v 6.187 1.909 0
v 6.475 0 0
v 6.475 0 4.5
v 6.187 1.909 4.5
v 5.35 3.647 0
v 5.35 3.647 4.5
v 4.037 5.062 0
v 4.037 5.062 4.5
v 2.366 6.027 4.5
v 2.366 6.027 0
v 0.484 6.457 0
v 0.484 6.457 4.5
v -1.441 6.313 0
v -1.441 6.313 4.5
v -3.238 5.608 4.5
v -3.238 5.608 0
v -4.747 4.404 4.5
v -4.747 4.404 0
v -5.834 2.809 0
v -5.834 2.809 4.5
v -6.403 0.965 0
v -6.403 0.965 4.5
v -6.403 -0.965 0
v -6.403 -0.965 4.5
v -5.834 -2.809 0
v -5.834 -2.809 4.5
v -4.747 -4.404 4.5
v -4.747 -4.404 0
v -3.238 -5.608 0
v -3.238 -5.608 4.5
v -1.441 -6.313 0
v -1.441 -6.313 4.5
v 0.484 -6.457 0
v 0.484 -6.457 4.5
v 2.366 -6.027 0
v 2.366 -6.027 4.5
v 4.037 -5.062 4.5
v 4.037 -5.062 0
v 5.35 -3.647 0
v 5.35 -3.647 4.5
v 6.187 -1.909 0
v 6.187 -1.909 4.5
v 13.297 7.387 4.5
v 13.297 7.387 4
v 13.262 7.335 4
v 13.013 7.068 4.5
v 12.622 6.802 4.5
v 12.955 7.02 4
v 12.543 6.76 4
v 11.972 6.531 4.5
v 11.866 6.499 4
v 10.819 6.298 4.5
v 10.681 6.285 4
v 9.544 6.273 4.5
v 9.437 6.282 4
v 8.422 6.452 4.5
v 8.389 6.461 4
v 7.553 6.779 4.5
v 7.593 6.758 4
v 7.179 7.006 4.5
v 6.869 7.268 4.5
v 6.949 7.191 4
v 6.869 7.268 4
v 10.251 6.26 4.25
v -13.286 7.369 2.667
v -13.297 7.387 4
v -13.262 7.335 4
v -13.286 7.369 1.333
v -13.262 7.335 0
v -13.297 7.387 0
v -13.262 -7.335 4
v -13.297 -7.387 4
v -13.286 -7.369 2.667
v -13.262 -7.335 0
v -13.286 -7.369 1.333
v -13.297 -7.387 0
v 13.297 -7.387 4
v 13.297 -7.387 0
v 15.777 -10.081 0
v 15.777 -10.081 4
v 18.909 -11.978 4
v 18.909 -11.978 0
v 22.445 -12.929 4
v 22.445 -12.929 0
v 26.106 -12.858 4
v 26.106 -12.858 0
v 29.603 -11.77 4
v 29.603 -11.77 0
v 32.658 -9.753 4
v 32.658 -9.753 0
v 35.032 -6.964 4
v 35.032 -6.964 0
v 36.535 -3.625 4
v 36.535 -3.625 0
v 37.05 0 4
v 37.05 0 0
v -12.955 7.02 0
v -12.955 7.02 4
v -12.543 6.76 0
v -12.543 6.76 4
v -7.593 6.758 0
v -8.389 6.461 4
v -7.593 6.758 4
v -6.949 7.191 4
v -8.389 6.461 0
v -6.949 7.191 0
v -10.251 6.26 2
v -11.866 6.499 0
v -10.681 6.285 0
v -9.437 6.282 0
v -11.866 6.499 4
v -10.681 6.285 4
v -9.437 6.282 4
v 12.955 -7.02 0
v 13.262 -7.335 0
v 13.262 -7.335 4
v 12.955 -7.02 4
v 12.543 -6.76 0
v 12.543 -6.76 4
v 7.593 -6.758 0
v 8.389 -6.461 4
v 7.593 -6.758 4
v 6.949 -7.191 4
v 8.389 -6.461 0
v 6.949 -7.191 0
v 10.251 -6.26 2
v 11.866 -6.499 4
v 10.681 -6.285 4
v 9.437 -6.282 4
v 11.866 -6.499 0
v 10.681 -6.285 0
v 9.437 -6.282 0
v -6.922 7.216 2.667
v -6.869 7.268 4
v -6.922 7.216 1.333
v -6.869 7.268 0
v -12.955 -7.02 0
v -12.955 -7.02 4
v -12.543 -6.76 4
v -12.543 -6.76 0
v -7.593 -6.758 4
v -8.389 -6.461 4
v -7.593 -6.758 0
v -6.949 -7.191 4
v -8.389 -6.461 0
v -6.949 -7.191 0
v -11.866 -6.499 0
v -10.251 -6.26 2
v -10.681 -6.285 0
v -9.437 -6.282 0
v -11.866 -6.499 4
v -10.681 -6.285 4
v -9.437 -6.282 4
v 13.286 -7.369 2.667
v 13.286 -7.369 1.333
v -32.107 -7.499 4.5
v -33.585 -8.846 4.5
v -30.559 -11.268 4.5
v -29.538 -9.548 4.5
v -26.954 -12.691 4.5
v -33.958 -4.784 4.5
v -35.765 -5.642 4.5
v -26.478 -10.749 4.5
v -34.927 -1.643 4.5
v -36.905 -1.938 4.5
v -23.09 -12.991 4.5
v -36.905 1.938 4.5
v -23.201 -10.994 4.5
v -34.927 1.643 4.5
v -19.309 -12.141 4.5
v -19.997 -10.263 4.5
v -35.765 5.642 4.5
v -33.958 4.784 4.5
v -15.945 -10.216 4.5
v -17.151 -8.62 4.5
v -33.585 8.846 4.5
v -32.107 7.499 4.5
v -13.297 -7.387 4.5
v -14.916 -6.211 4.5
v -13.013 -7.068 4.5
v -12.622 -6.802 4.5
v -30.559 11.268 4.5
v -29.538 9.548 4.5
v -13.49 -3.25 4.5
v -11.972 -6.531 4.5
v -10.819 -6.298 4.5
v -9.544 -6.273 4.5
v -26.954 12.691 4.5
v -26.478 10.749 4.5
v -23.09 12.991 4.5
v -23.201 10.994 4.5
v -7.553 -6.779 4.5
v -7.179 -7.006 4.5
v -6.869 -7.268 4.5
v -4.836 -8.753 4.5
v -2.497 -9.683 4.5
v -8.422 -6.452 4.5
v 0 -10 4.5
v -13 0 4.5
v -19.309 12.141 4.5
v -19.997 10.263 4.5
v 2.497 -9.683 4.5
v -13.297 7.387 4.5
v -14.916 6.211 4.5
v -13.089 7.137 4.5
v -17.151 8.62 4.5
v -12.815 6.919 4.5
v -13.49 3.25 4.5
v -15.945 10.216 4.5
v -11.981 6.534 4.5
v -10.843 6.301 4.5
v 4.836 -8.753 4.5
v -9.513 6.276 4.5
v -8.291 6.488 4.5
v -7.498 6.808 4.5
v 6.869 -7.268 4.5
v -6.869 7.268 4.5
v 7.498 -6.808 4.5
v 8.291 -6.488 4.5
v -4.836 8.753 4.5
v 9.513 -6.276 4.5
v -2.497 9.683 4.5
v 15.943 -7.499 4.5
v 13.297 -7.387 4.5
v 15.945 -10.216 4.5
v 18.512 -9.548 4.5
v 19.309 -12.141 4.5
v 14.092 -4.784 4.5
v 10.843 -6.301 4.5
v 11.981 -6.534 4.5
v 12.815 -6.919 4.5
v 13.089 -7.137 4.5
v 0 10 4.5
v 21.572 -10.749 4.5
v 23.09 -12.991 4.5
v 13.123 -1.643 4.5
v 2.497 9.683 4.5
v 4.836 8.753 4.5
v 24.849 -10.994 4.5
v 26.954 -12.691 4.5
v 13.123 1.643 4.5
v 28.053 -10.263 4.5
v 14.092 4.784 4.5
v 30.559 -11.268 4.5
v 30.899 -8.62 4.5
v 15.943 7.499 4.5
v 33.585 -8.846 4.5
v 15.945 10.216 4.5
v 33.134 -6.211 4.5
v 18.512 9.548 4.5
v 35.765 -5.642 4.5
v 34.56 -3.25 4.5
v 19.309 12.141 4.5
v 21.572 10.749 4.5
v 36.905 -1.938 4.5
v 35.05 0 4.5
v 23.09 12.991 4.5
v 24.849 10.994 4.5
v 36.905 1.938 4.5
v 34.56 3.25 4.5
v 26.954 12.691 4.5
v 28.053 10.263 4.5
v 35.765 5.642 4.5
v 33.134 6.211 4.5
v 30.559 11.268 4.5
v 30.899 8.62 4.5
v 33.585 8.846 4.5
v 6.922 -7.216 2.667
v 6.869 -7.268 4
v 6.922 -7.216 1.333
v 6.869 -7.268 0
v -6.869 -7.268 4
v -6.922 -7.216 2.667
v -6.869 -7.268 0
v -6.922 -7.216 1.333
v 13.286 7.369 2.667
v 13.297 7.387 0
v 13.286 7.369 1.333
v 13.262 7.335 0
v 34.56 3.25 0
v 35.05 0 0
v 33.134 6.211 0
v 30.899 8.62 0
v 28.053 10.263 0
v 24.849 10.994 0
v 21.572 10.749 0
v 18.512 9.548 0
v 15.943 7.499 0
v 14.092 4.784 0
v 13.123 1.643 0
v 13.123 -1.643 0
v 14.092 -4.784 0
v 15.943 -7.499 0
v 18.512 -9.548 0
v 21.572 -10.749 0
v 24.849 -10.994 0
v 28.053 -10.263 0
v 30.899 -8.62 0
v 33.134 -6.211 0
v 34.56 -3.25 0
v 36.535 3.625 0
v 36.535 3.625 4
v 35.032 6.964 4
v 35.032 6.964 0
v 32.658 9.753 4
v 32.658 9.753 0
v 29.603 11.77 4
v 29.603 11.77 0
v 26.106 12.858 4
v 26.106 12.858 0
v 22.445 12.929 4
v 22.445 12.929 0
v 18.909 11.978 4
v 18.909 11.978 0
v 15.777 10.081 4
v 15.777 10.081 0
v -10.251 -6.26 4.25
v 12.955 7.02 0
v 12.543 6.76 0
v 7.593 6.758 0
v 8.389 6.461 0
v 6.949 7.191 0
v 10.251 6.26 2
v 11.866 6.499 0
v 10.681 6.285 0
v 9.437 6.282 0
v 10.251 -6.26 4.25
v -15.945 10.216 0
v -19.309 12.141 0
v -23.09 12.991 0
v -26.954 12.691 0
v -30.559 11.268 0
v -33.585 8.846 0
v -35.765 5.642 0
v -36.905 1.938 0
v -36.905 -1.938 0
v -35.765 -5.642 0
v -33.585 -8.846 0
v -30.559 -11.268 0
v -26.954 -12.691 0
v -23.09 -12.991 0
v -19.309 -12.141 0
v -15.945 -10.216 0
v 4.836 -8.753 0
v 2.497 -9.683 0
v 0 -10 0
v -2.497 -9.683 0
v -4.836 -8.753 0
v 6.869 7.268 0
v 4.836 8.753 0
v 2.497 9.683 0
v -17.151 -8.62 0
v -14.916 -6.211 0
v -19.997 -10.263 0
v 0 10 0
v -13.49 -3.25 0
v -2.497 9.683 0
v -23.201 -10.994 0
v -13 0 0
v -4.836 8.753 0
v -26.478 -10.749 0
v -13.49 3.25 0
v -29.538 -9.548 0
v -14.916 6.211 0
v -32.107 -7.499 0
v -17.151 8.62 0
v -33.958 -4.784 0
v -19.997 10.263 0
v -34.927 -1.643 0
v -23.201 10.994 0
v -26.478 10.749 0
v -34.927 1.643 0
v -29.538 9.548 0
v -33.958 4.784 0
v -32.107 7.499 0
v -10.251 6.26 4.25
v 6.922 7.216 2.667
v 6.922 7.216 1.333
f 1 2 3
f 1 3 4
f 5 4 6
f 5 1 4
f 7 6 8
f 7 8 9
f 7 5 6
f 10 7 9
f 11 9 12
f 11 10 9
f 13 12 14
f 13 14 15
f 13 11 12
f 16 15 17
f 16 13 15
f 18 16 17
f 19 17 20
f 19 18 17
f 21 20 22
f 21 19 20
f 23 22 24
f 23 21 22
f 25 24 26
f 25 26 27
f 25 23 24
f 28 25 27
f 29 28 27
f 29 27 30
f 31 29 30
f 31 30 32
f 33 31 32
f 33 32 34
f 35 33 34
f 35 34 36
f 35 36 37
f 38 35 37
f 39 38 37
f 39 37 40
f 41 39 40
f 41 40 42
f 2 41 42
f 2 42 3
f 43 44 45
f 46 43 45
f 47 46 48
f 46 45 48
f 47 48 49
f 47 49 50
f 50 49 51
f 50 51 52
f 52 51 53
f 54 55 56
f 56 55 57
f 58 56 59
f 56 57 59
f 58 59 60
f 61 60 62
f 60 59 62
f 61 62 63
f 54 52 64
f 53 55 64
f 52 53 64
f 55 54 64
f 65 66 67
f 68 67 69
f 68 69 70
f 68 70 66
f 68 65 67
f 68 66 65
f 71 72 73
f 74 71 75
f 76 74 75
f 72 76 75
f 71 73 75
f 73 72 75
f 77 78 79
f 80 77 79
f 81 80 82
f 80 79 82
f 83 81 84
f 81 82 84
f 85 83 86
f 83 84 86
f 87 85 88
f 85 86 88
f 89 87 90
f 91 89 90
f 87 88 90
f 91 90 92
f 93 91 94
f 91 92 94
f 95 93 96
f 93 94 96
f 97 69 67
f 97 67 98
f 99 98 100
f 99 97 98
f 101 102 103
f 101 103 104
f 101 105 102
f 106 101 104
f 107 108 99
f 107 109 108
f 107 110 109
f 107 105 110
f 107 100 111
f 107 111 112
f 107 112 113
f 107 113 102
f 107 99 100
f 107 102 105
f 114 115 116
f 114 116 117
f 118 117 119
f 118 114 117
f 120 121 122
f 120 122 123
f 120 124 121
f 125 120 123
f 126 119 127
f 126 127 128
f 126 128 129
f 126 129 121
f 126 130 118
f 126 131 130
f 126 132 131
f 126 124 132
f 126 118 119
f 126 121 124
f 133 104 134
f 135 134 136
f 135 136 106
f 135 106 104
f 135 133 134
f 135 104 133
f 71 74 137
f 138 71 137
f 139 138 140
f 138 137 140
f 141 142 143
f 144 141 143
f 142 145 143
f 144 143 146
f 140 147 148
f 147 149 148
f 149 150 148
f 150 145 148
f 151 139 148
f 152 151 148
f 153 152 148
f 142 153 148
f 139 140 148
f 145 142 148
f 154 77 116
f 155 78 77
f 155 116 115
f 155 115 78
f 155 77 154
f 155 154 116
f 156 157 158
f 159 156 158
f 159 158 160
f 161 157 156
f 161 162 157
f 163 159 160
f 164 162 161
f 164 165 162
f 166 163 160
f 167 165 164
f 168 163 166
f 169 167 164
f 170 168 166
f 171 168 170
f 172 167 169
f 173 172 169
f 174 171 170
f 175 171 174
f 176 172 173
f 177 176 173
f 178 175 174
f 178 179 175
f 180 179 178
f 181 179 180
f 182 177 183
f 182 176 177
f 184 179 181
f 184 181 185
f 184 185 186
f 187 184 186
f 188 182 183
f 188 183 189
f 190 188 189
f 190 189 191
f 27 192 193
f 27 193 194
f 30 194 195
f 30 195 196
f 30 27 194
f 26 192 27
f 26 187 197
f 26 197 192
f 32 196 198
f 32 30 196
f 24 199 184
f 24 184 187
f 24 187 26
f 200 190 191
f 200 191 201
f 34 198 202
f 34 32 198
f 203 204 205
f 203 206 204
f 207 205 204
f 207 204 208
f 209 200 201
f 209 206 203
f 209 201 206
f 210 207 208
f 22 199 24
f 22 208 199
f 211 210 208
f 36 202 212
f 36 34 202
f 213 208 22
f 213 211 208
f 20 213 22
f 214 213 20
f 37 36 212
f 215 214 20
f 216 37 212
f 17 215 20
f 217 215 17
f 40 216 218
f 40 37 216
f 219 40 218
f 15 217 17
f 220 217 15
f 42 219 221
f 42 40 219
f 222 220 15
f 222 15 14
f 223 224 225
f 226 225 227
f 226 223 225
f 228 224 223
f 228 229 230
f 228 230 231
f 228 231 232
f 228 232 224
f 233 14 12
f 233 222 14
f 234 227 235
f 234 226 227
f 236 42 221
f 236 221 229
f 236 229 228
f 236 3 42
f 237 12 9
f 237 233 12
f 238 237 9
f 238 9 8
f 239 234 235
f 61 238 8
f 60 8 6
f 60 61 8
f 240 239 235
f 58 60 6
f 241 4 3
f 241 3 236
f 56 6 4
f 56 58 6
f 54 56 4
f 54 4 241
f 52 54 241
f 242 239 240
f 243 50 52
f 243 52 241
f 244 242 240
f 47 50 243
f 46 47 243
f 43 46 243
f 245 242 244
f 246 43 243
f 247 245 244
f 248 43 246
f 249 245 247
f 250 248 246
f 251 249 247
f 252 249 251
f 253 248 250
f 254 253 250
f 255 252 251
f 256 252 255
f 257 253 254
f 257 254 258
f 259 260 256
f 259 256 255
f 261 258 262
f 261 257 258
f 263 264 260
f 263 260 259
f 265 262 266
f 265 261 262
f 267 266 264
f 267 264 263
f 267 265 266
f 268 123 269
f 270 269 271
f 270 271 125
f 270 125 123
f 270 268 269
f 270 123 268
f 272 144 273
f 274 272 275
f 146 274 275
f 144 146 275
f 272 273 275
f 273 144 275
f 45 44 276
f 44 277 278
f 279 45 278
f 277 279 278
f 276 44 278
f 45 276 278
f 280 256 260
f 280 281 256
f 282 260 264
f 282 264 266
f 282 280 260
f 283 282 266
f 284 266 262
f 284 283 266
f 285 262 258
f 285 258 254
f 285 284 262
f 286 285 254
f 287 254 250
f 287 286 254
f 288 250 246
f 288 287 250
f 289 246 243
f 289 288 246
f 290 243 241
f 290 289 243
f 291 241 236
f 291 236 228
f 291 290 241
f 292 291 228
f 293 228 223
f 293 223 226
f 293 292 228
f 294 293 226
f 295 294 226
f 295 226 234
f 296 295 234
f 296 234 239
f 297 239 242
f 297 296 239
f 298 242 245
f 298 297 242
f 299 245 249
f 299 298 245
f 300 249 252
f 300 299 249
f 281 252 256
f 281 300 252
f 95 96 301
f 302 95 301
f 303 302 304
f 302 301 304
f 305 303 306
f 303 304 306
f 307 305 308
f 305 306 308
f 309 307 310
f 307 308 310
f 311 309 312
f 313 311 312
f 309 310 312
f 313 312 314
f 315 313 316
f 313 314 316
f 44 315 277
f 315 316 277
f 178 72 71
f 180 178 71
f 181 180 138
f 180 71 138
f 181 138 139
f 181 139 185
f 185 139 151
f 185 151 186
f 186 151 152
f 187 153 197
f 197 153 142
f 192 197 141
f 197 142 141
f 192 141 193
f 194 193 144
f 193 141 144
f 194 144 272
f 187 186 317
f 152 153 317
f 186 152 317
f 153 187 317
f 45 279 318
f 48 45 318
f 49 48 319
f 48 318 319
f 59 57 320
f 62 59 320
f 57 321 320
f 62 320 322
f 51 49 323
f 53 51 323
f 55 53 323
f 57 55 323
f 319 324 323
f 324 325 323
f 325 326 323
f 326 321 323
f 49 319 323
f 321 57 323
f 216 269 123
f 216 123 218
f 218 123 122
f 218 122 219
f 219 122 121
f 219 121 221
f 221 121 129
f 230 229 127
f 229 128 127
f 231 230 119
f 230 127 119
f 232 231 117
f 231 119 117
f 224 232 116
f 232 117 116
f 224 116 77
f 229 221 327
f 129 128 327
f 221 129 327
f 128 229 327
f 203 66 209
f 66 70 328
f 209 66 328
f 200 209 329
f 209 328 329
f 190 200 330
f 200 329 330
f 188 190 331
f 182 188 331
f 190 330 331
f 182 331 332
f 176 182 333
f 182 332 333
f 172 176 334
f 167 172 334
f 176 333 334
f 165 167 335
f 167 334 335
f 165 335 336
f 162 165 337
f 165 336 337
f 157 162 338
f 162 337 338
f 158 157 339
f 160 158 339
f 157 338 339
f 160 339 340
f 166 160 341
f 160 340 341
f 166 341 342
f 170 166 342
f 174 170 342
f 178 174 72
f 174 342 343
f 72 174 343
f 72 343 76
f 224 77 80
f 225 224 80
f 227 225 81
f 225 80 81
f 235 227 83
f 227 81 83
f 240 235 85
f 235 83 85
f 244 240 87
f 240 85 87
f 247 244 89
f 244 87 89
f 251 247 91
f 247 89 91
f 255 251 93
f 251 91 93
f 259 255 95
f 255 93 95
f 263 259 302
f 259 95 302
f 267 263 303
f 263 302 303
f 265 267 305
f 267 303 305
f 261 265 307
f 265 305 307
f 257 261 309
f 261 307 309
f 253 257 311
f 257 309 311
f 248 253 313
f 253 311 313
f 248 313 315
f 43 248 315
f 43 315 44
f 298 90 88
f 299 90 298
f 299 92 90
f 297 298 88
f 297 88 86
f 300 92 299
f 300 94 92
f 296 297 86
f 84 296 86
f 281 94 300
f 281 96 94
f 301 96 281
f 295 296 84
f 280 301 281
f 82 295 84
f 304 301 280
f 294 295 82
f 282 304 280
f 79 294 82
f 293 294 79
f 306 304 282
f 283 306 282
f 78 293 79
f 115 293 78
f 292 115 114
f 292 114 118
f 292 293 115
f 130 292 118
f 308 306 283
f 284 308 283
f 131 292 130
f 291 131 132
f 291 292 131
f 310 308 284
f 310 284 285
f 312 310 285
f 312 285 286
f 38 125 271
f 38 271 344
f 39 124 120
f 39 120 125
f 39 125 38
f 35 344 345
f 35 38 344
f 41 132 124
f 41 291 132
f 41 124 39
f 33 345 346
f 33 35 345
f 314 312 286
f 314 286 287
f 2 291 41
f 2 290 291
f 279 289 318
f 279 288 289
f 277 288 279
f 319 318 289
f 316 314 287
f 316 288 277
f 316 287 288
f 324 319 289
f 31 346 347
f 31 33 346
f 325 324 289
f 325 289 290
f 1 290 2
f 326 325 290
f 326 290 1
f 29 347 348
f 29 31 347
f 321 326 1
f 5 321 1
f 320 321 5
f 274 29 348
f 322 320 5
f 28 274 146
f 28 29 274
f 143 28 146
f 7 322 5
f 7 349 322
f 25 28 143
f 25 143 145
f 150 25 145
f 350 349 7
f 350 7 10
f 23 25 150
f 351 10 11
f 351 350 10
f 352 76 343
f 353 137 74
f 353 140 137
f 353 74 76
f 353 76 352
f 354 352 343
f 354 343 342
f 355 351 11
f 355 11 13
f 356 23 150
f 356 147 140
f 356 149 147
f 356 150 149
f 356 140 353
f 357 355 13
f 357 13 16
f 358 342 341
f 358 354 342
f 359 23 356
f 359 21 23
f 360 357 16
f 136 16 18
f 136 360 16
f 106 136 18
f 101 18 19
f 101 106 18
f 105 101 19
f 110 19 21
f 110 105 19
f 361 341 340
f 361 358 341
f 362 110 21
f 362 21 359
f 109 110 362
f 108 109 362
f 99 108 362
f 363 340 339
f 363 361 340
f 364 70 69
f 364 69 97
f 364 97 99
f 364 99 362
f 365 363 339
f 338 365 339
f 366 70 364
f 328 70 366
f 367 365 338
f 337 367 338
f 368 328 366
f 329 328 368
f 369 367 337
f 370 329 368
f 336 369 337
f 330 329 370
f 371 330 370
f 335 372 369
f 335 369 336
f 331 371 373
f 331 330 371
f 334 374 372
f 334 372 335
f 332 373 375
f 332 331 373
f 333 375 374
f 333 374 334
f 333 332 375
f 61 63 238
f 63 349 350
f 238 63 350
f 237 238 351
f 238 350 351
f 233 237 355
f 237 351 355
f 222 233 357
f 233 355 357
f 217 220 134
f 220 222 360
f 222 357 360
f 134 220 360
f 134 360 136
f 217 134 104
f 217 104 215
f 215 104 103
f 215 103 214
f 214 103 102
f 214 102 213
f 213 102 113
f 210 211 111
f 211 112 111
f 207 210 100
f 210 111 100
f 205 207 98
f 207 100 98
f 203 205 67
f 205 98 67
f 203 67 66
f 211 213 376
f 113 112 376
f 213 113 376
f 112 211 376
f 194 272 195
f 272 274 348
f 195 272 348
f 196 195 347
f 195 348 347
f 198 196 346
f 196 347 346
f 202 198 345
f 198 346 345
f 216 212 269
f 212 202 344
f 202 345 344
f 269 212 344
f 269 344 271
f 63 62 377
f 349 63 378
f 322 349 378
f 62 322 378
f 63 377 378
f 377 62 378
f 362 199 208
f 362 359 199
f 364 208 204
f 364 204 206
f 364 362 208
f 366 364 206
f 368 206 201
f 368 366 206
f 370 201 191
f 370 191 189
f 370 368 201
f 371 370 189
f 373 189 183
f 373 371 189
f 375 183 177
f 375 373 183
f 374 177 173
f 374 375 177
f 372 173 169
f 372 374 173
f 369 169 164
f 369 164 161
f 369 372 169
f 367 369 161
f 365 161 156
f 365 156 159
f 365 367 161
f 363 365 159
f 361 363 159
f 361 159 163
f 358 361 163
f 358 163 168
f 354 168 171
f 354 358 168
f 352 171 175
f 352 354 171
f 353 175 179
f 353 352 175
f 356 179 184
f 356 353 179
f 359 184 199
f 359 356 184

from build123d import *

# Parameters (mm, degrees)
F0_R        = 11.025
F0_R_2      = 8
F0_R_3      = 6.475
F1_DEPTH    = 4
F2_DEPTH    = 4.5
F1_FACE_R   = 11.025
F1_FACE_R_2 = 8
F3_DEPTH    = 0.5


# Not quite as in the source:
# - a feature names something its author has since deleted; it is built from what else it names


with BuildPart() as f1:
    # F0 (on Top) → F1 (new body)
    with BuildSketch(Plane.XY):
        with BuildLine():
            add(Edge.make_bspline(
                [(-13.2970699227, 7.3866190681), (-13.2858031983, 7.3692786835), (-13.2740607617, 7.352142708), (-13.2618542065, 7.3352108101)],
                knots=[0, 0, 0, 0, 0.0117546856, 0.0117546856, 0.0117546856, 0.0117546856], degree=3))
            ThreePointArc((-13.2970699227, 7.3866190681), (-37.05, 0), (-13.2970699227, -7.3866190681))
            add(Edge.make_bspline(
                [(-13.2970699227, -7.3866190681), (-13.2858031983, -7.3692786835), (-13.2740607617, -7.352142708), (-13.2618542065, -7.3352108101)],
                knots=[0, 0, 0, 0, 0.0117546856, 0.0117546856, 0.0117546856, 0.0117546856], degree=3))
            ThreePointArc((-13.2618542065, -7.3352108101), (-11.5783016635, -3.8380106201), (-11, 0))
            ThreePointArc((-11, 0), (-11.5783016635, 3.8380106201), (-13.2618542065, 7.3352108101))
        make_face()
        with Locations((-24.025, 0)):
            Circle(F0_R, mode=Mode.SUBTRACT)
        with BuildLine():
            add(Edge.make_bspline(
                [(13.2970699227, 7.3866190681), (13.2858031983, 7.3692786835), (13.2740607617, 7.352142708), (13.2618542065, 7.3352108101)],
                knots=[0, 0, 0, 0, 0.0117546856, 0.0117546856, 0.0117546856, 0.0117546856], degree=3))
            ThreePointArc((13.2618542065, 7.3352108101), (11, 0), (13.2618542065, -7.3352108101))
            add(Edge.make_bspline(
                [(13.2970699227, -7.3866190681), (13.2858031983, -7.3692786835), (13.2740607617, -7.352142708), (13.2618542065, -7.3352108101)],
                knots=[0, 0, 0, 0, 0.0117546856, 0.0117546856, 0.0117546856, 0.0117546856], degree=3))
            ThreePointArc((13.2970699227, -7.3866190681), (27.8927729861, -12.4374819448), (37.05, 0))
            ThreePointArc((37.05, 0), (27.8927729861, 12.4374819448), (13.2970699227, 7.3866190681))
        make_face()
        with Locations((24.025, 0)):
            Circle(F0_R, mode=Mode.SUBTRACT)
        with BuildLine():
            add(Edge.make_bspline(
                [(-6.9491121946, 7.1909554099), (-6.9214787847, 7.2161071506), (-6.8945995038, 7.2417846871), (-6.8685019311, 7.2679901776)],
                knots=[0.9815772058, 0.9815772058, 0.9815772058, 0.9815772058, 1, 1, 1, 1], degree=3))
            ThreePointArc((-6.9491121946, 7.1909554099), (-10, 0), (-6.9491121946, -7.1909554099))
            add(Edge.make_bspline(
                [(-6.9491121946, -7.1909554099), (-6.9214787847, -7.2161071506), (-6.8945995038, -7.2417846871), (-6.8685019311, -7.2679901776)],
                knots=[0.9815772058, 0.9815772058, 0.9815772058, 0.9815772058, 1, 1, 1, 1], degree=3))
            ThreePointArc((-6.8685019311, -7.2679901776), (0, -10), (6.8685019311, -7.2679901776))
            add(Edge.make_bspline(
                [(6.9491121946, -7.1909554099), (6.9214787847, -7.2161071506), (6.8945995038, -7.2417846871), (6.8685019311, -7.2679901776)],
                knots=[0.9815772058, 0.9815772058, 0.9815772058, 0.9815772058, 1, 1, 1, 1], degree=3))
            ThreePointArc((6.9491121946, -7.1909554099), (9.2057352217, -3.9056931558), (10, 0))
            ThreePointArc((10, 0), (9.2057352217, 3.9056931558), (6.9491121946, 7.1909554099))
            add(Edge.make_bspline(
                [(6.9491121946, 7.1909554099), (6.9214787847, 7.2161071506), (6.8945995038, 7.2417846871), (6.8685019311, 7.2679901776)],
                knots=[0.9815772058, 0.9815772058, 0.9815772058, 0.9815772058, 1, 1, 1, 1], degree=3))
            ThreePointArc((6.8685019311, 7.2679901776), (0, 10), (-6.8685019311, 7.2679901776))
        make_face()
        Circle(F0_R_2, mode=Mode.SUBTRACT)
        Circle(F0_R_2)
        Circle(F0_R_3, mode=Mode.SUBTRACT)
        with BuildLine():
            add(Edge.make_bspline(
                [(-13.2618542065, 7.3352108101), (-12.765654406, 6.6469245328), (-10.2019626219, 5.934402015), (-7.687078337, 6.5192636743), (-6.9491121946, 7.1909554099)],
                knots=[0.0117546856, 0.0117546856, 0.0117546856, 0.0117546856, 0.4895858662, 0.9815772058, 0.9815772058, 0.9815772058, 0.9815772058], degree=3))
            ThreePointArc((-13.2618542065, 7.3352108101), (-11.5783016635, 3.8380106201), (-11, 0))
            ThreePointArc((-11, 0), (-11.5783016635, -3.8380106201), (-13.2618542065, -7.3352108101))
            add(Edge.make_bspline(
                [(-13.2618542065, -7.3352108101), (-12.765654406, -6.6469245328), (-10.2019626219, -5.934402015), (-7.687078337, -6.5192636743), (-6.9491121946, -7.1909554099)],
                knots=[0.0117546856, 0.0117546856, 0.0117546856, 0.0117546856, 0.4895858662, 0.9815772058, 0.9815772058, 0.9815772058, 0.9815772058], degree=3))
            ThreePointArc((-6.9491121946, -7.1909554099), (-10, 0), (-6.9491121946, 7.1909554099))
        make_face()
        with BuildLine():
            add(Edge.make_bspline(
                [(13.2618542065, 7.3352108101), (12.765654406, 6.6469245328), (10.2019626219, 5.934402015), (7.687078337, 6.5192636743), (6.9491121946, 7.1909554099)],
                knots=[0.0117546856, 0.0117546856, 0.0117546856, 0.0117546856, 0.4895858662, 0.9815772058, 0.9815772058, 0.9815772058, 0.9815772058], degree=3))
            ThreePointArc((6.9491121946, 7.1909554099), (9.2057352217, 3.9056931558), (10, 0))
            ThreePointArc((10, 0), (9.2057352217, -3.9056931558), (6.9491121946, -7.1909554099))
            add(Edge.make_bspline(
                [(13.2618542065, -7.3352108101), (12.765654406, -6.6469245328), (10.2019626219, -5.934402015), (7.687078337, -6.5192636743), (6.9491121946, -7.1909554099)],
                knots=[0.0117546856, 0.0117546856, 0.0117546856, 0.0117546856, 0.4895858662, 0.9815772058, 0.9815772058, 0.9815772058, 0.9815772058], degree=3))
            ThreePointArc((13.2618542065, -7.3352108101), (11, 0), (13.2618542065, 7.3352108101))
        make_face()
    extrude(amount=F1_DEPTH)

    # F0 (on Top) → F2 (join)
    with BuildSketch(Plane.XY):
        Circle(F0_R_2)
        Circle(F0_R_3, mode=Mode.SUBTRACT)
    extrude(amount=F2_DEPTH)

    # F1_face (on face) + F0 (on Top) → F3 (join, through all)
    with BuildSketch(Plane.XY.offset(4)):
        with BuildLine():
            ThreePointArc((-6.8685019311, -7.2679901776), (0, -10), (6.8685019311, -7.2679901776))
            add(Edge.make_bspline(
                [(6.8685019311, -7.2679901776), (7.591550229, -6.5419519543), (10.1837329047, -5.9134794065), (12.8278077735, -6.6643873129), (13.2970699227, -7.3866190681)],
                knots=[0.9815772058, 0.9815772058, 0.9815772058, 0.9815772058, 1.4919913396, 1.9815772058, 1.9815772058, 1.9815772058, 1.9815772058], degree=3))
            ThreePointArc((13.2970699227, -7.3866190681), (37.05, 0), (13.2970699227, 7.3866190681))
            add(Edge.make_bspline(
                [(13.2970699227, 7.3866190681), (12.8278077735, 6.6643873129), (10.1837329047, 5.9134794065), (7.591550229, 6.5419519543), (6.8685019311, 7.2679901776)],
                knots=[0, 0, 0, 0, 0.4895858662, 1, 1, 1, 1], degree=3))
            ThreePointArc((6.8685019311, 7.2679901776), (0, 10), (-6.8685019311, 7.2679901776))
            add(Edge.make_bspline(
                [(-6.8685019311, 7.2679901776), (-7.591550229, 6.5419519543), (-10.1837329047, 5.9134794066), (-12.8278077735, 6.6643873129), (-13.2970699227, 7.3866190681)],
                knots=[0.9815772058, 0.9815772058, 0.9815772058, 0.9815772058, 1.4919913396, 1.9815772058, 1.9815772058, 1.9815772058, 1.9815772058], degree=3))
            ThreePointArc((-13.2970699227, 7.3866190681), (-37.05, 0), (-13.2970699227, -7.3866190681))
            add(Edge.make_bspline(
                [(-13.2970699227, -7.3866190681), (-12.8278077735, -6.6643873129), (-10.1837329047, -5.9134794065), (-7.591550229, -6.5419519543), (-6.8685019311, -7.2679901776)],
                knots=[0, 0, 0, 0, 0.4895858662, 1, 1, 1, 1], degree=3))
        make_face()
        with Locations((-24.025, 0)):
            Circle(F1_FACE_R, mode=Mode.SUBTRACT)
        Circle(F1_FACE_R_2, mode=Mode.SUBTRACT)
        with Locations((24.025, 0)):
            Circle(F1_FACE_R, mode=Mode.SUBTRACT)
    with BuildSketch(Plane.XY):
        with BuildLine():
            add(Edge.make_bspline(
                [(-13.2970699227, 7.3866190681), (-13.2858031983, 7.3692786835), (-13.2740607617, 7.352142708), (-13.2618542065, 7.3352108101)],
                knots=[0, 0, 0, 0, 0.0117546856, 0.0117546856, 0.0117546856, 0.0117546856], degree=3))
            ThreePointArc((-13.2970699227, 7.3866190681), (-37.05, 0), (-13.2970699227, -7.3866190681))
            add(Edge.make_bspline(
                [(-13.2970699227, -7.3866190681), (-13.2858031983, -7.3692786835), (-13.2740607617, -7.352142708), (-13.2618542065, -7.3352108101)],
                knots=[0, 0, 0, 0, 0.0117546856, 0.0117546856, 0.0117546856, 0.0117546856], degree=3))
            ThreePointArc((-13.2618542065, -7.3352108101), (-11.5783016635, -3.8380106201), (-11, 0))
            ThreePointArc((-11, 0), (-11.5783016635, 3.8380106201), (-13.2618542065, 7.3352108101))
        make_face()
        with Locations((-24.025, 0)):
            Circle(F0_R, mode=Mode.SUBTRACT)
        with BuildLine():
            add(Edge.make_bspline(
                [(-13.2618542065, 7.3352108101), (-12.765654406, 6.6469245328), (-10.2019626219, 5.934402015), (-7.687078337, 6.5192636743), (-6.9491121946, 7.1909554099)],
                knots=[0.0117546856, 0.0117546856, 0.0117546856, 0.0117546856, 0.4895858662, 0.9815772058, 0.9815772058, 0.9815772058, 0.9815772058], degree=3))
            ThreePointArc((-13.2618542065, 7.3352108101), (-11.5783016635, 3.8380106201), (-11, 0))
            ThreePointArc((-11, 0), (-11.5783016635, -3.8380106201), (-13.2618542065, -7.3352108101))
            add(Edge.make_bspline(
                [(-13.2618542065, -7.3352108101), (-12.765654406, -6.6469245328), (-10.2019626219, -5.934402015), (-7.687078337, -6.5192636743), (-6.9491121946, -7.1909554099)],
                knots=[0.0117546856, 0.0117546856, 0.0117546856, 0.0117546856, 0.4895858662, 0.9815772058, 0.9815772058, 0.9815772058, 0.9815772058], degree=3))
            ThreePointArc((-6.9491121946, -7.1909554099), (-10, 0), (-6.9491121946, 7.1909554099))
        make_face()
        with BuildLine():
            add(Edge.make_bspline(
                [(-6.9491121946, 7.1909554099), (-6.9214787847, 7.2161071506), (-6.8945995038, 7.2417846871), (-6.8685019311, 7.2679901776)],
                knots=[0.9815772058, 0.9815772058, 0.9815772058, 0.9815772058, 1, 1, 1, 1], degree=3))
            ThreePointArc((-6.9491121946, 7.1909554099), (-10, 0), (-6.9491121946, -7.1909554099))
            add(Edge.make_bspline(
                [(-6.9491121946, -7.1909554099), (-6.9214787847, -7.2161071506), (-6.8945995038, -7.2417846871), (-6.8685019311, -7.2679901776)],
                knots=[0.9815772058, 0.9815772058, 0.9815772058, 0.9815772058, 1, 1, 1, 1], degree=3))
            ThreePointArc((-6.8685019311, -7.2679901776), (0, -10), (6.8685019311, -7.2679901776))
            add(Edge.make_bspline(
                [(6.9491121946, -7.1909554099), (6.9214787847, -7.2161071506), (6.8945995038, -7.2417846871), (6.8685019311, -7.2679901776)],
                knots=[0.9815772058, 0.9815772058, 0.9815772058, 0.9815772058, 1, 1, 1, 1], degree=3))
            ThreePointArc((6.9491121946, -7.1909554099), (9.2057352217, -3.9056931558), (10, 0))
            ThreePointArc((10, 0), (9.2057352217, 3.9056931558), (6.9491121946, 7.1909554099))
            add(Edge.make_bspline(
                [(6.9491121946, 7.1909554099), (6.9214787847, 7.2161071506), (6.8945995038, 7.2417846871), (6.8685019311, 7.2679901776)],
                knots=[0.9815772058, 0.9815772058, 0.9815772058, 0.9815772058, 1, 1, 1, 1], degree=3))
            ThreePointArc((6.8685019311, 7.2679901776), (0, 10), (-6.8685019311, 7.2679901776))
        make_face()
        Circle(F0_R_2, mode=Mode.SUBTRACT)
    extrude(amount=F3_DEPTH)


solid = f1.part
